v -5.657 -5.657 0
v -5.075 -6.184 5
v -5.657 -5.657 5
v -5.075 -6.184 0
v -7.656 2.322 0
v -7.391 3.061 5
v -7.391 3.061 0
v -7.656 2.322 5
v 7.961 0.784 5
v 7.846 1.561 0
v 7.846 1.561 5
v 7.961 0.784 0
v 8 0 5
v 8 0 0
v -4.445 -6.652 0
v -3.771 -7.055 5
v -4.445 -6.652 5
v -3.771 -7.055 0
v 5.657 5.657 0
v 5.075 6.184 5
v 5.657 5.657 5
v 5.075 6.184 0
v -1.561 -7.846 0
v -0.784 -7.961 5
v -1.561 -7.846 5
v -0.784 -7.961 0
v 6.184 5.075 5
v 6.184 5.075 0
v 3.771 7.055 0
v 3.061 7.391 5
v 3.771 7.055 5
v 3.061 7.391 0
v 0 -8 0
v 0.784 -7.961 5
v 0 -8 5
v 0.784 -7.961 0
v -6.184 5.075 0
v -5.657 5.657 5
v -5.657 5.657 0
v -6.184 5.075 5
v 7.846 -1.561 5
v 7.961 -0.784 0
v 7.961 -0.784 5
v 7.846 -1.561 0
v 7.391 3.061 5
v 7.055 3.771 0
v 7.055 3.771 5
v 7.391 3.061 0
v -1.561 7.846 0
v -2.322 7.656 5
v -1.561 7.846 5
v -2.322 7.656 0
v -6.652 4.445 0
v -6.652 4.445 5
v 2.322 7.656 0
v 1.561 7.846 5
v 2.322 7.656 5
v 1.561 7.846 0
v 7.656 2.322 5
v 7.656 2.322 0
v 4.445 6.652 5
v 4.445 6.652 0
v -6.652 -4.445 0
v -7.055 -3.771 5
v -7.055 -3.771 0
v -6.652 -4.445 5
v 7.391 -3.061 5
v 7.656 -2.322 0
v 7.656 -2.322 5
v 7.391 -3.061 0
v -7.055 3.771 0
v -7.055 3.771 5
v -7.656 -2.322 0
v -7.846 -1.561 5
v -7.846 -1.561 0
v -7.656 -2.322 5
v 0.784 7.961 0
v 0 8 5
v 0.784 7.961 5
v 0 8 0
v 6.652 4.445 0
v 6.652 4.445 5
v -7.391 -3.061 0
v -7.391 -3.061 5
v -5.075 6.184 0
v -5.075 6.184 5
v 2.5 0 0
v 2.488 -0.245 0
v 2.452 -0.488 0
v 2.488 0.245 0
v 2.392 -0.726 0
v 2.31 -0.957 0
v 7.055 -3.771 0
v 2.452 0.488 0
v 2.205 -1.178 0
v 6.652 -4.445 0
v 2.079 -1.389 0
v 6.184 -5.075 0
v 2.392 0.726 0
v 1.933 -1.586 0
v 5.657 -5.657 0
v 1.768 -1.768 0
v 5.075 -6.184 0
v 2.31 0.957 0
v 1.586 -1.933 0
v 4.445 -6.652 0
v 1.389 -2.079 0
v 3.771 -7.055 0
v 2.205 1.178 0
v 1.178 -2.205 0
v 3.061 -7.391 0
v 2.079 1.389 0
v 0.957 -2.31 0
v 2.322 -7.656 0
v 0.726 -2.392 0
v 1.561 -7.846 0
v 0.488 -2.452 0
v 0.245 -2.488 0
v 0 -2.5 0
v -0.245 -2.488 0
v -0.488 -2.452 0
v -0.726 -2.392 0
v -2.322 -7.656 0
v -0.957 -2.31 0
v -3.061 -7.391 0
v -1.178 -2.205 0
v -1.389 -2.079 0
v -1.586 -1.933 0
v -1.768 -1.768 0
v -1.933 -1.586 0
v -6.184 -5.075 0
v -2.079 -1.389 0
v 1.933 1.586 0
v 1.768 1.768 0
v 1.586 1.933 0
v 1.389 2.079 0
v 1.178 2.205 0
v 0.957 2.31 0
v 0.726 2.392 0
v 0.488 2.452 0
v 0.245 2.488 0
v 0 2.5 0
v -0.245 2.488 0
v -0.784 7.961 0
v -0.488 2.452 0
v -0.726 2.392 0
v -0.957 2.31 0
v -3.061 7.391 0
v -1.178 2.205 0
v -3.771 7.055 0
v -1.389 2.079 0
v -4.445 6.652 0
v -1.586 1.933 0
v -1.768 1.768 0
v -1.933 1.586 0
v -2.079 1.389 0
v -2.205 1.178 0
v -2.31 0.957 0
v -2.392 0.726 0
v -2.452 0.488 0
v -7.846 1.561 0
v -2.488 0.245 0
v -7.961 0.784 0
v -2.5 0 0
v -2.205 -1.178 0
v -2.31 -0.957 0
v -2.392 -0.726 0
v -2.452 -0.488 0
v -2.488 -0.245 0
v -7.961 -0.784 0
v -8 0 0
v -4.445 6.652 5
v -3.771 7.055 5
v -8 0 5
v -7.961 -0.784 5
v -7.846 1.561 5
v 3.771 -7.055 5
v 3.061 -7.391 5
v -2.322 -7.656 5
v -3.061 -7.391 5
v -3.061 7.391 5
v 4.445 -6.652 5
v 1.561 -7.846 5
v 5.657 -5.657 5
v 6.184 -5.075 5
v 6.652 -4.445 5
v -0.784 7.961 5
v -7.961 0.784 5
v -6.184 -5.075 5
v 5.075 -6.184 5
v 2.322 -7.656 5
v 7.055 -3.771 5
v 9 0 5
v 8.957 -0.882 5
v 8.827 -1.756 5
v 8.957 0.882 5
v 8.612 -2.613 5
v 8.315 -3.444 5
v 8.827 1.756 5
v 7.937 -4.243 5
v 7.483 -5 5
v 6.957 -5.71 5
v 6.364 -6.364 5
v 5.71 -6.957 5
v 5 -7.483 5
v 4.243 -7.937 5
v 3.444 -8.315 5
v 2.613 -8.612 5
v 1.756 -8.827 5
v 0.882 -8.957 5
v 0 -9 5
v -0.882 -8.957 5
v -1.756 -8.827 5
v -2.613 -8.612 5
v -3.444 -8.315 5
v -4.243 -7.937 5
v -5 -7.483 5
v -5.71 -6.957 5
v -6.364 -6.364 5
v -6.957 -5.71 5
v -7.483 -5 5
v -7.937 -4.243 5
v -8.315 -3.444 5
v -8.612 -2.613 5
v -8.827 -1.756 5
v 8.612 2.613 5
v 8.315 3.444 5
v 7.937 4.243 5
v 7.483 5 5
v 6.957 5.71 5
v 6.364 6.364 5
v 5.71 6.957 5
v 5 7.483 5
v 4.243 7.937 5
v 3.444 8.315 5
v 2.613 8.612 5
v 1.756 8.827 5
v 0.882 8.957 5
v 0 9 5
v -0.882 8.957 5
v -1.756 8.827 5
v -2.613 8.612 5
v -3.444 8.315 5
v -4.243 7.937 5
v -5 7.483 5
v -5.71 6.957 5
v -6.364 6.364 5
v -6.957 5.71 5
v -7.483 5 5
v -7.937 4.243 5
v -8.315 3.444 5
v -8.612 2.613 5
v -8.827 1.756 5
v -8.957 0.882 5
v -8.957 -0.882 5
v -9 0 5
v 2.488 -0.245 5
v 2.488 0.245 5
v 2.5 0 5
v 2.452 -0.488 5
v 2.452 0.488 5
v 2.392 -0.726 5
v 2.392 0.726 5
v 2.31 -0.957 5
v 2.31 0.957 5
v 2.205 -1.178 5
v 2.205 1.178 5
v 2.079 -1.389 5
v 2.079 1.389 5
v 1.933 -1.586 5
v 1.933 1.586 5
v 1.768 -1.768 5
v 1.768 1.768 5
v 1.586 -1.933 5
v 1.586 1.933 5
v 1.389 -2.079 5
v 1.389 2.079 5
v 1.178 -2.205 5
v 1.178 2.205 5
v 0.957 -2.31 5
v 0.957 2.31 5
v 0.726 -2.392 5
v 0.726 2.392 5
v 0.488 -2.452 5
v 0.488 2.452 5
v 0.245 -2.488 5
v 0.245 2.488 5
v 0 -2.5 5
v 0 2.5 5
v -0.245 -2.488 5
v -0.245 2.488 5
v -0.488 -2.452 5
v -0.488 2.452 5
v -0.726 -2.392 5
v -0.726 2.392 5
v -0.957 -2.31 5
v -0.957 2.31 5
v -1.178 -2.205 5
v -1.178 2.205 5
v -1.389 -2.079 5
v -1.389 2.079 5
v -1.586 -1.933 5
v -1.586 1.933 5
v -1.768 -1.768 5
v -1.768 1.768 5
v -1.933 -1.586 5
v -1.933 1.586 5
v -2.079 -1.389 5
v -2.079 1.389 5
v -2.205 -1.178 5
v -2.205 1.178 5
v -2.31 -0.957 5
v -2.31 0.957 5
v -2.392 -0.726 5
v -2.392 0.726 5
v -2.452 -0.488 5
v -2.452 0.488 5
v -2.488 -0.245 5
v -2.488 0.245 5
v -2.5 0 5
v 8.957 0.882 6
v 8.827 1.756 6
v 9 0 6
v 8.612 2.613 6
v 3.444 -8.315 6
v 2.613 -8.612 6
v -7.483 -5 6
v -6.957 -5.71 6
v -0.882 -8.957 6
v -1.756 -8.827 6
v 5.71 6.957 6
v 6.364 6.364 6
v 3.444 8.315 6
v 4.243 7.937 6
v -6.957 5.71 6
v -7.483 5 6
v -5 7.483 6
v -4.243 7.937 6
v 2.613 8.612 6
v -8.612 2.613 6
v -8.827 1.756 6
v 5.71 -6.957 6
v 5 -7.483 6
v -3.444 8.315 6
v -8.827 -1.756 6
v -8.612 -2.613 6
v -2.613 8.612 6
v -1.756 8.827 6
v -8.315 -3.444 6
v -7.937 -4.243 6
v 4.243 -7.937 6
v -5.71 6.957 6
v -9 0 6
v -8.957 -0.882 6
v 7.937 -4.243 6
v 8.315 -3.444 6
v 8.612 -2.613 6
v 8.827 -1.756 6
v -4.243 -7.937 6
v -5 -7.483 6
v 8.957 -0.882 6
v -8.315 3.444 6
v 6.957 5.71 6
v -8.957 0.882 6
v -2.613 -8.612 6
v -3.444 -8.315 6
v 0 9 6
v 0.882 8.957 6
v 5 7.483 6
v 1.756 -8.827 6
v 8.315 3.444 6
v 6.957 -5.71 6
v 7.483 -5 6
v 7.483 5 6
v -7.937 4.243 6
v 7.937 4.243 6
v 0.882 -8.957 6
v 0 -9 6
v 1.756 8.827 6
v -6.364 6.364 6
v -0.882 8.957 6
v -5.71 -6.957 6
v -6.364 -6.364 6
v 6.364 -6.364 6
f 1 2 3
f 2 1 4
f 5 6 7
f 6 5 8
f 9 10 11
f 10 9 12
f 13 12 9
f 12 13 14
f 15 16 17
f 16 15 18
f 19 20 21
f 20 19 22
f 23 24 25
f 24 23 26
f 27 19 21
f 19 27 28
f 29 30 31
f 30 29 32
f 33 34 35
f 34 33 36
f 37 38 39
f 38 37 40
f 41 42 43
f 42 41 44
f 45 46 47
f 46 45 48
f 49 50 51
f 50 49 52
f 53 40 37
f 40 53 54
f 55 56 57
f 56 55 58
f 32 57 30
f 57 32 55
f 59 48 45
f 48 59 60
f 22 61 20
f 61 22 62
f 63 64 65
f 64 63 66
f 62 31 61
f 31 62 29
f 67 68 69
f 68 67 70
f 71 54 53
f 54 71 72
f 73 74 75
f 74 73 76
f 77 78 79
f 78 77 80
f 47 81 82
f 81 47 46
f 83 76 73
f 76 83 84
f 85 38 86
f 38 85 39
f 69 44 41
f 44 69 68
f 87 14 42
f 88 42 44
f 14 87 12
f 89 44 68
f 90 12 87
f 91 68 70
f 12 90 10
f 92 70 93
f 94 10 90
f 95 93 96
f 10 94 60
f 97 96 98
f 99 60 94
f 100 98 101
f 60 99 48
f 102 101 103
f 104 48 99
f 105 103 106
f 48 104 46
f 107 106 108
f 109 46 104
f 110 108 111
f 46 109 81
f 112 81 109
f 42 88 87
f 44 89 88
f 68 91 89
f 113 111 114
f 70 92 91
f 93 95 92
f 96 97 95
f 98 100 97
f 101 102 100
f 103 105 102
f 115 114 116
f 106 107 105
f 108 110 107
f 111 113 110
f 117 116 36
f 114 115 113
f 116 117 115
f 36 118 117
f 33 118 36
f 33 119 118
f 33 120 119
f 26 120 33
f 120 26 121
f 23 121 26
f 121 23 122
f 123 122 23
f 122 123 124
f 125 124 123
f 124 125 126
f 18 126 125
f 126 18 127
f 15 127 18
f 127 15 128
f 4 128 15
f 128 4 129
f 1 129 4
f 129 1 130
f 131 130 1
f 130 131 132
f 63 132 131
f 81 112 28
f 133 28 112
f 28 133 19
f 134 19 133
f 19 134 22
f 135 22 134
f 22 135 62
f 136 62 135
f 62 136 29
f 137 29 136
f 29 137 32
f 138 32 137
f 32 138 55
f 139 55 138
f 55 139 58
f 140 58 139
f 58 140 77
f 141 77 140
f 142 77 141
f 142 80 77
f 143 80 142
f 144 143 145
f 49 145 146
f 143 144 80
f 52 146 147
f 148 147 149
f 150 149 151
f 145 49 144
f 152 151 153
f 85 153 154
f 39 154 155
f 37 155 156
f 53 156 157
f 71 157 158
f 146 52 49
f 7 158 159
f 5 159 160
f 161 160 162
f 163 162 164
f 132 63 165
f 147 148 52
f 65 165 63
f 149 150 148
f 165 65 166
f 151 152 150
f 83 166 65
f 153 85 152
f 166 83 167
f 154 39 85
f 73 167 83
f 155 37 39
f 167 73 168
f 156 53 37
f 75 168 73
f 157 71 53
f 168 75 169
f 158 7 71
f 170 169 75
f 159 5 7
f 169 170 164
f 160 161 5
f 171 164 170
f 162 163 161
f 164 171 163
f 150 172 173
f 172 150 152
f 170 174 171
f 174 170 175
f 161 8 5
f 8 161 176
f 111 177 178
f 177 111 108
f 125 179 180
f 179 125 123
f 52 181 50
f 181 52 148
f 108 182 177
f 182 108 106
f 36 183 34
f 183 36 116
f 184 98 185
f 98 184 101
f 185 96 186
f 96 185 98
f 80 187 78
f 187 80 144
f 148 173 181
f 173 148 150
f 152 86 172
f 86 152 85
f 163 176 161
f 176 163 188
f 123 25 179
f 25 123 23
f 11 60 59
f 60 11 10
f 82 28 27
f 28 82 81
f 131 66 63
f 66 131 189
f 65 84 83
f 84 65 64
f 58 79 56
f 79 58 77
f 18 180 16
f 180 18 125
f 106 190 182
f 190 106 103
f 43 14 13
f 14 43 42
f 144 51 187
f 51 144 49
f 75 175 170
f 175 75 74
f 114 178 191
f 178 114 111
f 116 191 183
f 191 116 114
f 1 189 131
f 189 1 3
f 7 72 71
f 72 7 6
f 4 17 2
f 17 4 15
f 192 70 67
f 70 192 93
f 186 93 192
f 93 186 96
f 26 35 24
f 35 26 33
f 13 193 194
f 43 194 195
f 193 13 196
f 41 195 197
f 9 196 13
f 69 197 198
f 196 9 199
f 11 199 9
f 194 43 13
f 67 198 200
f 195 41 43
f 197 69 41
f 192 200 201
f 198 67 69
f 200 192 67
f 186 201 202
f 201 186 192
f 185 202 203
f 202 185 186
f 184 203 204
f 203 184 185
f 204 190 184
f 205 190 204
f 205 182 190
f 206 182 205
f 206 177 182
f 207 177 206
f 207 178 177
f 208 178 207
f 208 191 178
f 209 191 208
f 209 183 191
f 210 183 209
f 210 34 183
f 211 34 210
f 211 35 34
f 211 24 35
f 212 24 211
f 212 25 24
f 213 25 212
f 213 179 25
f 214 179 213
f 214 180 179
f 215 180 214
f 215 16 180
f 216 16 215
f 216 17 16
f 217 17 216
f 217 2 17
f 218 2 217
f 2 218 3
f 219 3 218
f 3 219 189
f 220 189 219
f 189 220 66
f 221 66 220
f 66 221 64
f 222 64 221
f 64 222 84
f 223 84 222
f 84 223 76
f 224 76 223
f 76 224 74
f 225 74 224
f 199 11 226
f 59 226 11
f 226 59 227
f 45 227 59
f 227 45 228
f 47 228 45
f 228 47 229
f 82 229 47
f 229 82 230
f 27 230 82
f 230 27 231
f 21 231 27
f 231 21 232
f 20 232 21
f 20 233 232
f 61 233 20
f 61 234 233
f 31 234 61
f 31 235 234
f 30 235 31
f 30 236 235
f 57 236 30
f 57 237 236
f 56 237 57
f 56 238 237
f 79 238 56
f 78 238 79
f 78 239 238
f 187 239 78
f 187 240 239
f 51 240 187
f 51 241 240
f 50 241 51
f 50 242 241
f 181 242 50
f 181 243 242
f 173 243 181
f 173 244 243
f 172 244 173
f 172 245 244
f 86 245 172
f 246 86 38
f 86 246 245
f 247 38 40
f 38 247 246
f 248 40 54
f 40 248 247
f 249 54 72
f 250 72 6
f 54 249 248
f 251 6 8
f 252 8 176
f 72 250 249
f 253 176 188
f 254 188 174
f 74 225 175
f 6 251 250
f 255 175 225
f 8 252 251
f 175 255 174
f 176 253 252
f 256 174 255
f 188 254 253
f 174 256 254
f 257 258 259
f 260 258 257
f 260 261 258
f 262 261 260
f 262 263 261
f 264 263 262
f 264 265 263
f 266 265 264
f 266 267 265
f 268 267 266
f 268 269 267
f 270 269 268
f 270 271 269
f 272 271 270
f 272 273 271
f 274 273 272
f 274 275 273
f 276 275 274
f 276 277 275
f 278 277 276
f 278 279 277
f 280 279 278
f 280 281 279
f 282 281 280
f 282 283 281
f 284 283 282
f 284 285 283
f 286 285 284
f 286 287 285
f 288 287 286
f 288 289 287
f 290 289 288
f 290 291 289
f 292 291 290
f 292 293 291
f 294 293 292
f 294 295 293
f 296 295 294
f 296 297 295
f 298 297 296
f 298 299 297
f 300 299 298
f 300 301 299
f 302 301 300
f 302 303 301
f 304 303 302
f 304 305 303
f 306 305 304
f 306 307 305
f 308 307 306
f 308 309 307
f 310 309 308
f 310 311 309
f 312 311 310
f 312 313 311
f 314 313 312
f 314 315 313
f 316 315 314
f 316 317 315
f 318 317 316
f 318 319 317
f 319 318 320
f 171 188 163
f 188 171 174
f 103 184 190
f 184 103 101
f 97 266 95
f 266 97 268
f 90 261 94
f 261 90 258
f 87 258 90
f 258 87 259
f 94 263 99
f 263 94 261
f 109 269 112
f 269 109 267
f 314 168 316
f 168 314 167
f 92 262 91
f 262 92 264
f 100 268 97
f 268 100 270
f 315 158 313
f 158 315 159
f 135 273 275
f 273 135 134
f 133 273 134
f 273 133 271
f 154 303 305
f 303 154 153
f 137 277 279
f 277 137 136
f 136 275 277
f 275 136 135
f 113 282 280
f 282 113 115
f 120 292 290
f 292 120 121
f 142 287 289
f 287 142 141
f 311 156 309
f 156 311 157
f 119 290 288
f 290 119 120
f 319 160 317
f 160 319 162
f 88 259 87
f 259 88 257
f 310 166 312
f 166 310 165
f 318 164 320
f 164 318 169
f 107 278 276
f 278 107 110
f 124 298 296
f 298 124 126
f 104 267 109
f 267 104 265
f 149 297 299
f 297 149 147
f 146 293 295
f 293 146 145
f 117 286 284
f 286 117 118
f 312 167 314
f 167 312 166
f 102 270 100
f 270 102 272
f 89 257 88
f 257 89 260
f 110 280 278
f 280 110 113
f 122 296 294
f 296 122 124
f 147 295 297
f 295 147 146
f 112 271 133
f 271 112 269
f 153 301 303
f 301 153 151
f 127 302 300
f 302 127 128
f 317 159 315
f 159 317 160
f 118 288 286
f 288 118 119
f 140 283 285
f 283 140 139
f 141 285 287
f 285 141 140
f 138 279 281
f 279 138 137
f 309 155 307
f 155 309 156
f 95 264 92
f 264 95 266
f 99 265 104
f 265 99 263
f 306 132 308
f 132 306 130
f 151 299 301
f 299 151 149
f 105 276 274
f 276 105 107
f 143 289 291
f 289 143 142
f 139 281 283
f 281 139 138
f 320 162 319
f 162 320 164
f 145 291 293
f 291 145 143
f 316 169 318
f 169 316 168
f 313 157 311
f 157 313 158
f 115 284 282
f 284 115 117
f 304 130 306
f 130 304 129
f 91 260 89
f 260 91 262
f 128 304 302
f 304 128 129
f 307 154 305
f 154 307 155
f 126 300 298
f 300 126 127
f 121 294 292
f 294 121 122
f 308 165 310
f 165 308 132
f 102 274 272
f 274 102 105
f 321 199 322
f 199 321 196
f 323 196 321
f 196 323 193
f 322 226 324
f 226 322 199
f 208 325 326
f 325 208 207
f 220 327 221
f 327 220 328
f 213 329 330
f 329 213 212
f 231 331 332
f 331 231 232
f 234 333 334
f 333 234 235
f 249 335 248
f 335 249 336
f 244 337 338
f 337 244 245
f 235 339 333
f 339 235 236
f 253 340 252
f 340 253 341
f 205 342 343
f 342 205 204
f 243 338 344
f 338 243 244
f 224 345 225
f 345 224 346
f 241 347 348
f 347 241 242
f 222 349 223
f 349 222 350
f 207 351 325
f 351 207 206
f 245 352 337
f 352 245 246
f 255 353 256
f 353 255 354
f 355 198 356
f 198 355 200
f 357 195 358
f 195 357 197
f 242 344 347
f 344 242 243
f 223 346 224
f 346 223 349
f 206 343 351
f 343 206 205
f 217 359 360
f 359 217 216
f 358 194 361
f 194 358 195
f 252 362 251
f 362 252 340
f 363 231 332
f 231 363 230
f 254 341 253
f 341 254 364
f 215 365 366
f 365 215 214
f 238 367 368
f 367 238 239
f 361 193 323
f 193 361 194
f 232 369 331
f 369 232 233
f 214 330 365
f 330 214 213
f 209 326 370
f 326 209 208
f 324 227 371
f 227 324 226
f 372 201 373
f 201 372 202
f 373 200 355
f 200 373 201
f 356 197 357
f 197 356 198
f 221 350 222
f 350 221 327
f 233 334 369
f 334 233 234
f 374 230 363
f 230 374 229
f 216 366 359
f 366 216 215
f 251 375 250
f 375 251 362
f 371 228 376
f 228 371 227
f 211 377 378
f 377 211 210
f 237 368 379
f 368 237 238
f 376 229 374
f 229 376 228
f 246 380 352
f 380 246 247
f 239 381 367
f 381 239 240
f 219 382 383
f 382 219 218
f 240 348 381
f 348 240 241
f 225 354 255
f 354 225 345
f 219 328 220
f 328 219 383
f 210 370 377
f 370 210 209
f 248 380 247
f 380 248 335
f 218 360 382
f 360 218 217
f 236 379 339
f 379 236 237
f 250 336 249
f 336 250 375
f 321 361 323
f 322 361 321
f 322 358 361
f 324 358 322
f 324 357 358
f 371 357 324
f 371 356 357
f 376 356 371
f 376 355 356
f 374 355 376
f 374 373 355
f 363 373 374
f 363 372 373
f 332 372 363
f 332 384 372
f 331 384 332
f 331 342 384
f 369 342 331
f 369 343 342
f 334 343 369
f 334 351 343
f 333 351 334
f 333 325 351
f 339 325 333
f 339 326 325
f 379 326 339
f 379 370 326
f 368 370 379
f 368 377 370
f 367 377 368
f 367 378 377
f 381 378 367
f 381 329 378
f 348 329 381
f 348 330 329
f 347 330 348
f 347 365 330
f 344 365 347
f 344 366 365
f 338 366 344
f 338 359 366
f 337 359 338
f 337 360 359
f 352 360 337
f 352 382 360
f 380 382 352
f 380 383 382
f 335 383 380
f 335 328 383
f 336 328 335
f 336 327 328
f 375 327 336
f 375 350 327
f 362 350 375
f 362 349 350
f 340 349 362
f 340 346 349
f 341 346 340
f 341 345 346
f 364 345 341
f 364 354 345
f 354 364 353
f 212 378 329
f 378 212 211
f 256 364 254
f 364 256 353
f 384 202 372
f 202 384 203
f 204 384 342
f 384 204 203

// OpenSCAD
module flanged_ball_bearing() {
    difference() {
        // Outer cylinder of the bearing
        cylinder(h=5.0, d=16.0, $fn=64);
        
        // Inner bore
        translate([0, 0, -1])
            cylinder(h=7.0, d=5.0, $fn=64);
    }
    
    // Flange
    translate([0, 0, 5.0])
        cylinder(h=1.0, d=18.0, $fn=64);
}

flanged_ball_bearing();
